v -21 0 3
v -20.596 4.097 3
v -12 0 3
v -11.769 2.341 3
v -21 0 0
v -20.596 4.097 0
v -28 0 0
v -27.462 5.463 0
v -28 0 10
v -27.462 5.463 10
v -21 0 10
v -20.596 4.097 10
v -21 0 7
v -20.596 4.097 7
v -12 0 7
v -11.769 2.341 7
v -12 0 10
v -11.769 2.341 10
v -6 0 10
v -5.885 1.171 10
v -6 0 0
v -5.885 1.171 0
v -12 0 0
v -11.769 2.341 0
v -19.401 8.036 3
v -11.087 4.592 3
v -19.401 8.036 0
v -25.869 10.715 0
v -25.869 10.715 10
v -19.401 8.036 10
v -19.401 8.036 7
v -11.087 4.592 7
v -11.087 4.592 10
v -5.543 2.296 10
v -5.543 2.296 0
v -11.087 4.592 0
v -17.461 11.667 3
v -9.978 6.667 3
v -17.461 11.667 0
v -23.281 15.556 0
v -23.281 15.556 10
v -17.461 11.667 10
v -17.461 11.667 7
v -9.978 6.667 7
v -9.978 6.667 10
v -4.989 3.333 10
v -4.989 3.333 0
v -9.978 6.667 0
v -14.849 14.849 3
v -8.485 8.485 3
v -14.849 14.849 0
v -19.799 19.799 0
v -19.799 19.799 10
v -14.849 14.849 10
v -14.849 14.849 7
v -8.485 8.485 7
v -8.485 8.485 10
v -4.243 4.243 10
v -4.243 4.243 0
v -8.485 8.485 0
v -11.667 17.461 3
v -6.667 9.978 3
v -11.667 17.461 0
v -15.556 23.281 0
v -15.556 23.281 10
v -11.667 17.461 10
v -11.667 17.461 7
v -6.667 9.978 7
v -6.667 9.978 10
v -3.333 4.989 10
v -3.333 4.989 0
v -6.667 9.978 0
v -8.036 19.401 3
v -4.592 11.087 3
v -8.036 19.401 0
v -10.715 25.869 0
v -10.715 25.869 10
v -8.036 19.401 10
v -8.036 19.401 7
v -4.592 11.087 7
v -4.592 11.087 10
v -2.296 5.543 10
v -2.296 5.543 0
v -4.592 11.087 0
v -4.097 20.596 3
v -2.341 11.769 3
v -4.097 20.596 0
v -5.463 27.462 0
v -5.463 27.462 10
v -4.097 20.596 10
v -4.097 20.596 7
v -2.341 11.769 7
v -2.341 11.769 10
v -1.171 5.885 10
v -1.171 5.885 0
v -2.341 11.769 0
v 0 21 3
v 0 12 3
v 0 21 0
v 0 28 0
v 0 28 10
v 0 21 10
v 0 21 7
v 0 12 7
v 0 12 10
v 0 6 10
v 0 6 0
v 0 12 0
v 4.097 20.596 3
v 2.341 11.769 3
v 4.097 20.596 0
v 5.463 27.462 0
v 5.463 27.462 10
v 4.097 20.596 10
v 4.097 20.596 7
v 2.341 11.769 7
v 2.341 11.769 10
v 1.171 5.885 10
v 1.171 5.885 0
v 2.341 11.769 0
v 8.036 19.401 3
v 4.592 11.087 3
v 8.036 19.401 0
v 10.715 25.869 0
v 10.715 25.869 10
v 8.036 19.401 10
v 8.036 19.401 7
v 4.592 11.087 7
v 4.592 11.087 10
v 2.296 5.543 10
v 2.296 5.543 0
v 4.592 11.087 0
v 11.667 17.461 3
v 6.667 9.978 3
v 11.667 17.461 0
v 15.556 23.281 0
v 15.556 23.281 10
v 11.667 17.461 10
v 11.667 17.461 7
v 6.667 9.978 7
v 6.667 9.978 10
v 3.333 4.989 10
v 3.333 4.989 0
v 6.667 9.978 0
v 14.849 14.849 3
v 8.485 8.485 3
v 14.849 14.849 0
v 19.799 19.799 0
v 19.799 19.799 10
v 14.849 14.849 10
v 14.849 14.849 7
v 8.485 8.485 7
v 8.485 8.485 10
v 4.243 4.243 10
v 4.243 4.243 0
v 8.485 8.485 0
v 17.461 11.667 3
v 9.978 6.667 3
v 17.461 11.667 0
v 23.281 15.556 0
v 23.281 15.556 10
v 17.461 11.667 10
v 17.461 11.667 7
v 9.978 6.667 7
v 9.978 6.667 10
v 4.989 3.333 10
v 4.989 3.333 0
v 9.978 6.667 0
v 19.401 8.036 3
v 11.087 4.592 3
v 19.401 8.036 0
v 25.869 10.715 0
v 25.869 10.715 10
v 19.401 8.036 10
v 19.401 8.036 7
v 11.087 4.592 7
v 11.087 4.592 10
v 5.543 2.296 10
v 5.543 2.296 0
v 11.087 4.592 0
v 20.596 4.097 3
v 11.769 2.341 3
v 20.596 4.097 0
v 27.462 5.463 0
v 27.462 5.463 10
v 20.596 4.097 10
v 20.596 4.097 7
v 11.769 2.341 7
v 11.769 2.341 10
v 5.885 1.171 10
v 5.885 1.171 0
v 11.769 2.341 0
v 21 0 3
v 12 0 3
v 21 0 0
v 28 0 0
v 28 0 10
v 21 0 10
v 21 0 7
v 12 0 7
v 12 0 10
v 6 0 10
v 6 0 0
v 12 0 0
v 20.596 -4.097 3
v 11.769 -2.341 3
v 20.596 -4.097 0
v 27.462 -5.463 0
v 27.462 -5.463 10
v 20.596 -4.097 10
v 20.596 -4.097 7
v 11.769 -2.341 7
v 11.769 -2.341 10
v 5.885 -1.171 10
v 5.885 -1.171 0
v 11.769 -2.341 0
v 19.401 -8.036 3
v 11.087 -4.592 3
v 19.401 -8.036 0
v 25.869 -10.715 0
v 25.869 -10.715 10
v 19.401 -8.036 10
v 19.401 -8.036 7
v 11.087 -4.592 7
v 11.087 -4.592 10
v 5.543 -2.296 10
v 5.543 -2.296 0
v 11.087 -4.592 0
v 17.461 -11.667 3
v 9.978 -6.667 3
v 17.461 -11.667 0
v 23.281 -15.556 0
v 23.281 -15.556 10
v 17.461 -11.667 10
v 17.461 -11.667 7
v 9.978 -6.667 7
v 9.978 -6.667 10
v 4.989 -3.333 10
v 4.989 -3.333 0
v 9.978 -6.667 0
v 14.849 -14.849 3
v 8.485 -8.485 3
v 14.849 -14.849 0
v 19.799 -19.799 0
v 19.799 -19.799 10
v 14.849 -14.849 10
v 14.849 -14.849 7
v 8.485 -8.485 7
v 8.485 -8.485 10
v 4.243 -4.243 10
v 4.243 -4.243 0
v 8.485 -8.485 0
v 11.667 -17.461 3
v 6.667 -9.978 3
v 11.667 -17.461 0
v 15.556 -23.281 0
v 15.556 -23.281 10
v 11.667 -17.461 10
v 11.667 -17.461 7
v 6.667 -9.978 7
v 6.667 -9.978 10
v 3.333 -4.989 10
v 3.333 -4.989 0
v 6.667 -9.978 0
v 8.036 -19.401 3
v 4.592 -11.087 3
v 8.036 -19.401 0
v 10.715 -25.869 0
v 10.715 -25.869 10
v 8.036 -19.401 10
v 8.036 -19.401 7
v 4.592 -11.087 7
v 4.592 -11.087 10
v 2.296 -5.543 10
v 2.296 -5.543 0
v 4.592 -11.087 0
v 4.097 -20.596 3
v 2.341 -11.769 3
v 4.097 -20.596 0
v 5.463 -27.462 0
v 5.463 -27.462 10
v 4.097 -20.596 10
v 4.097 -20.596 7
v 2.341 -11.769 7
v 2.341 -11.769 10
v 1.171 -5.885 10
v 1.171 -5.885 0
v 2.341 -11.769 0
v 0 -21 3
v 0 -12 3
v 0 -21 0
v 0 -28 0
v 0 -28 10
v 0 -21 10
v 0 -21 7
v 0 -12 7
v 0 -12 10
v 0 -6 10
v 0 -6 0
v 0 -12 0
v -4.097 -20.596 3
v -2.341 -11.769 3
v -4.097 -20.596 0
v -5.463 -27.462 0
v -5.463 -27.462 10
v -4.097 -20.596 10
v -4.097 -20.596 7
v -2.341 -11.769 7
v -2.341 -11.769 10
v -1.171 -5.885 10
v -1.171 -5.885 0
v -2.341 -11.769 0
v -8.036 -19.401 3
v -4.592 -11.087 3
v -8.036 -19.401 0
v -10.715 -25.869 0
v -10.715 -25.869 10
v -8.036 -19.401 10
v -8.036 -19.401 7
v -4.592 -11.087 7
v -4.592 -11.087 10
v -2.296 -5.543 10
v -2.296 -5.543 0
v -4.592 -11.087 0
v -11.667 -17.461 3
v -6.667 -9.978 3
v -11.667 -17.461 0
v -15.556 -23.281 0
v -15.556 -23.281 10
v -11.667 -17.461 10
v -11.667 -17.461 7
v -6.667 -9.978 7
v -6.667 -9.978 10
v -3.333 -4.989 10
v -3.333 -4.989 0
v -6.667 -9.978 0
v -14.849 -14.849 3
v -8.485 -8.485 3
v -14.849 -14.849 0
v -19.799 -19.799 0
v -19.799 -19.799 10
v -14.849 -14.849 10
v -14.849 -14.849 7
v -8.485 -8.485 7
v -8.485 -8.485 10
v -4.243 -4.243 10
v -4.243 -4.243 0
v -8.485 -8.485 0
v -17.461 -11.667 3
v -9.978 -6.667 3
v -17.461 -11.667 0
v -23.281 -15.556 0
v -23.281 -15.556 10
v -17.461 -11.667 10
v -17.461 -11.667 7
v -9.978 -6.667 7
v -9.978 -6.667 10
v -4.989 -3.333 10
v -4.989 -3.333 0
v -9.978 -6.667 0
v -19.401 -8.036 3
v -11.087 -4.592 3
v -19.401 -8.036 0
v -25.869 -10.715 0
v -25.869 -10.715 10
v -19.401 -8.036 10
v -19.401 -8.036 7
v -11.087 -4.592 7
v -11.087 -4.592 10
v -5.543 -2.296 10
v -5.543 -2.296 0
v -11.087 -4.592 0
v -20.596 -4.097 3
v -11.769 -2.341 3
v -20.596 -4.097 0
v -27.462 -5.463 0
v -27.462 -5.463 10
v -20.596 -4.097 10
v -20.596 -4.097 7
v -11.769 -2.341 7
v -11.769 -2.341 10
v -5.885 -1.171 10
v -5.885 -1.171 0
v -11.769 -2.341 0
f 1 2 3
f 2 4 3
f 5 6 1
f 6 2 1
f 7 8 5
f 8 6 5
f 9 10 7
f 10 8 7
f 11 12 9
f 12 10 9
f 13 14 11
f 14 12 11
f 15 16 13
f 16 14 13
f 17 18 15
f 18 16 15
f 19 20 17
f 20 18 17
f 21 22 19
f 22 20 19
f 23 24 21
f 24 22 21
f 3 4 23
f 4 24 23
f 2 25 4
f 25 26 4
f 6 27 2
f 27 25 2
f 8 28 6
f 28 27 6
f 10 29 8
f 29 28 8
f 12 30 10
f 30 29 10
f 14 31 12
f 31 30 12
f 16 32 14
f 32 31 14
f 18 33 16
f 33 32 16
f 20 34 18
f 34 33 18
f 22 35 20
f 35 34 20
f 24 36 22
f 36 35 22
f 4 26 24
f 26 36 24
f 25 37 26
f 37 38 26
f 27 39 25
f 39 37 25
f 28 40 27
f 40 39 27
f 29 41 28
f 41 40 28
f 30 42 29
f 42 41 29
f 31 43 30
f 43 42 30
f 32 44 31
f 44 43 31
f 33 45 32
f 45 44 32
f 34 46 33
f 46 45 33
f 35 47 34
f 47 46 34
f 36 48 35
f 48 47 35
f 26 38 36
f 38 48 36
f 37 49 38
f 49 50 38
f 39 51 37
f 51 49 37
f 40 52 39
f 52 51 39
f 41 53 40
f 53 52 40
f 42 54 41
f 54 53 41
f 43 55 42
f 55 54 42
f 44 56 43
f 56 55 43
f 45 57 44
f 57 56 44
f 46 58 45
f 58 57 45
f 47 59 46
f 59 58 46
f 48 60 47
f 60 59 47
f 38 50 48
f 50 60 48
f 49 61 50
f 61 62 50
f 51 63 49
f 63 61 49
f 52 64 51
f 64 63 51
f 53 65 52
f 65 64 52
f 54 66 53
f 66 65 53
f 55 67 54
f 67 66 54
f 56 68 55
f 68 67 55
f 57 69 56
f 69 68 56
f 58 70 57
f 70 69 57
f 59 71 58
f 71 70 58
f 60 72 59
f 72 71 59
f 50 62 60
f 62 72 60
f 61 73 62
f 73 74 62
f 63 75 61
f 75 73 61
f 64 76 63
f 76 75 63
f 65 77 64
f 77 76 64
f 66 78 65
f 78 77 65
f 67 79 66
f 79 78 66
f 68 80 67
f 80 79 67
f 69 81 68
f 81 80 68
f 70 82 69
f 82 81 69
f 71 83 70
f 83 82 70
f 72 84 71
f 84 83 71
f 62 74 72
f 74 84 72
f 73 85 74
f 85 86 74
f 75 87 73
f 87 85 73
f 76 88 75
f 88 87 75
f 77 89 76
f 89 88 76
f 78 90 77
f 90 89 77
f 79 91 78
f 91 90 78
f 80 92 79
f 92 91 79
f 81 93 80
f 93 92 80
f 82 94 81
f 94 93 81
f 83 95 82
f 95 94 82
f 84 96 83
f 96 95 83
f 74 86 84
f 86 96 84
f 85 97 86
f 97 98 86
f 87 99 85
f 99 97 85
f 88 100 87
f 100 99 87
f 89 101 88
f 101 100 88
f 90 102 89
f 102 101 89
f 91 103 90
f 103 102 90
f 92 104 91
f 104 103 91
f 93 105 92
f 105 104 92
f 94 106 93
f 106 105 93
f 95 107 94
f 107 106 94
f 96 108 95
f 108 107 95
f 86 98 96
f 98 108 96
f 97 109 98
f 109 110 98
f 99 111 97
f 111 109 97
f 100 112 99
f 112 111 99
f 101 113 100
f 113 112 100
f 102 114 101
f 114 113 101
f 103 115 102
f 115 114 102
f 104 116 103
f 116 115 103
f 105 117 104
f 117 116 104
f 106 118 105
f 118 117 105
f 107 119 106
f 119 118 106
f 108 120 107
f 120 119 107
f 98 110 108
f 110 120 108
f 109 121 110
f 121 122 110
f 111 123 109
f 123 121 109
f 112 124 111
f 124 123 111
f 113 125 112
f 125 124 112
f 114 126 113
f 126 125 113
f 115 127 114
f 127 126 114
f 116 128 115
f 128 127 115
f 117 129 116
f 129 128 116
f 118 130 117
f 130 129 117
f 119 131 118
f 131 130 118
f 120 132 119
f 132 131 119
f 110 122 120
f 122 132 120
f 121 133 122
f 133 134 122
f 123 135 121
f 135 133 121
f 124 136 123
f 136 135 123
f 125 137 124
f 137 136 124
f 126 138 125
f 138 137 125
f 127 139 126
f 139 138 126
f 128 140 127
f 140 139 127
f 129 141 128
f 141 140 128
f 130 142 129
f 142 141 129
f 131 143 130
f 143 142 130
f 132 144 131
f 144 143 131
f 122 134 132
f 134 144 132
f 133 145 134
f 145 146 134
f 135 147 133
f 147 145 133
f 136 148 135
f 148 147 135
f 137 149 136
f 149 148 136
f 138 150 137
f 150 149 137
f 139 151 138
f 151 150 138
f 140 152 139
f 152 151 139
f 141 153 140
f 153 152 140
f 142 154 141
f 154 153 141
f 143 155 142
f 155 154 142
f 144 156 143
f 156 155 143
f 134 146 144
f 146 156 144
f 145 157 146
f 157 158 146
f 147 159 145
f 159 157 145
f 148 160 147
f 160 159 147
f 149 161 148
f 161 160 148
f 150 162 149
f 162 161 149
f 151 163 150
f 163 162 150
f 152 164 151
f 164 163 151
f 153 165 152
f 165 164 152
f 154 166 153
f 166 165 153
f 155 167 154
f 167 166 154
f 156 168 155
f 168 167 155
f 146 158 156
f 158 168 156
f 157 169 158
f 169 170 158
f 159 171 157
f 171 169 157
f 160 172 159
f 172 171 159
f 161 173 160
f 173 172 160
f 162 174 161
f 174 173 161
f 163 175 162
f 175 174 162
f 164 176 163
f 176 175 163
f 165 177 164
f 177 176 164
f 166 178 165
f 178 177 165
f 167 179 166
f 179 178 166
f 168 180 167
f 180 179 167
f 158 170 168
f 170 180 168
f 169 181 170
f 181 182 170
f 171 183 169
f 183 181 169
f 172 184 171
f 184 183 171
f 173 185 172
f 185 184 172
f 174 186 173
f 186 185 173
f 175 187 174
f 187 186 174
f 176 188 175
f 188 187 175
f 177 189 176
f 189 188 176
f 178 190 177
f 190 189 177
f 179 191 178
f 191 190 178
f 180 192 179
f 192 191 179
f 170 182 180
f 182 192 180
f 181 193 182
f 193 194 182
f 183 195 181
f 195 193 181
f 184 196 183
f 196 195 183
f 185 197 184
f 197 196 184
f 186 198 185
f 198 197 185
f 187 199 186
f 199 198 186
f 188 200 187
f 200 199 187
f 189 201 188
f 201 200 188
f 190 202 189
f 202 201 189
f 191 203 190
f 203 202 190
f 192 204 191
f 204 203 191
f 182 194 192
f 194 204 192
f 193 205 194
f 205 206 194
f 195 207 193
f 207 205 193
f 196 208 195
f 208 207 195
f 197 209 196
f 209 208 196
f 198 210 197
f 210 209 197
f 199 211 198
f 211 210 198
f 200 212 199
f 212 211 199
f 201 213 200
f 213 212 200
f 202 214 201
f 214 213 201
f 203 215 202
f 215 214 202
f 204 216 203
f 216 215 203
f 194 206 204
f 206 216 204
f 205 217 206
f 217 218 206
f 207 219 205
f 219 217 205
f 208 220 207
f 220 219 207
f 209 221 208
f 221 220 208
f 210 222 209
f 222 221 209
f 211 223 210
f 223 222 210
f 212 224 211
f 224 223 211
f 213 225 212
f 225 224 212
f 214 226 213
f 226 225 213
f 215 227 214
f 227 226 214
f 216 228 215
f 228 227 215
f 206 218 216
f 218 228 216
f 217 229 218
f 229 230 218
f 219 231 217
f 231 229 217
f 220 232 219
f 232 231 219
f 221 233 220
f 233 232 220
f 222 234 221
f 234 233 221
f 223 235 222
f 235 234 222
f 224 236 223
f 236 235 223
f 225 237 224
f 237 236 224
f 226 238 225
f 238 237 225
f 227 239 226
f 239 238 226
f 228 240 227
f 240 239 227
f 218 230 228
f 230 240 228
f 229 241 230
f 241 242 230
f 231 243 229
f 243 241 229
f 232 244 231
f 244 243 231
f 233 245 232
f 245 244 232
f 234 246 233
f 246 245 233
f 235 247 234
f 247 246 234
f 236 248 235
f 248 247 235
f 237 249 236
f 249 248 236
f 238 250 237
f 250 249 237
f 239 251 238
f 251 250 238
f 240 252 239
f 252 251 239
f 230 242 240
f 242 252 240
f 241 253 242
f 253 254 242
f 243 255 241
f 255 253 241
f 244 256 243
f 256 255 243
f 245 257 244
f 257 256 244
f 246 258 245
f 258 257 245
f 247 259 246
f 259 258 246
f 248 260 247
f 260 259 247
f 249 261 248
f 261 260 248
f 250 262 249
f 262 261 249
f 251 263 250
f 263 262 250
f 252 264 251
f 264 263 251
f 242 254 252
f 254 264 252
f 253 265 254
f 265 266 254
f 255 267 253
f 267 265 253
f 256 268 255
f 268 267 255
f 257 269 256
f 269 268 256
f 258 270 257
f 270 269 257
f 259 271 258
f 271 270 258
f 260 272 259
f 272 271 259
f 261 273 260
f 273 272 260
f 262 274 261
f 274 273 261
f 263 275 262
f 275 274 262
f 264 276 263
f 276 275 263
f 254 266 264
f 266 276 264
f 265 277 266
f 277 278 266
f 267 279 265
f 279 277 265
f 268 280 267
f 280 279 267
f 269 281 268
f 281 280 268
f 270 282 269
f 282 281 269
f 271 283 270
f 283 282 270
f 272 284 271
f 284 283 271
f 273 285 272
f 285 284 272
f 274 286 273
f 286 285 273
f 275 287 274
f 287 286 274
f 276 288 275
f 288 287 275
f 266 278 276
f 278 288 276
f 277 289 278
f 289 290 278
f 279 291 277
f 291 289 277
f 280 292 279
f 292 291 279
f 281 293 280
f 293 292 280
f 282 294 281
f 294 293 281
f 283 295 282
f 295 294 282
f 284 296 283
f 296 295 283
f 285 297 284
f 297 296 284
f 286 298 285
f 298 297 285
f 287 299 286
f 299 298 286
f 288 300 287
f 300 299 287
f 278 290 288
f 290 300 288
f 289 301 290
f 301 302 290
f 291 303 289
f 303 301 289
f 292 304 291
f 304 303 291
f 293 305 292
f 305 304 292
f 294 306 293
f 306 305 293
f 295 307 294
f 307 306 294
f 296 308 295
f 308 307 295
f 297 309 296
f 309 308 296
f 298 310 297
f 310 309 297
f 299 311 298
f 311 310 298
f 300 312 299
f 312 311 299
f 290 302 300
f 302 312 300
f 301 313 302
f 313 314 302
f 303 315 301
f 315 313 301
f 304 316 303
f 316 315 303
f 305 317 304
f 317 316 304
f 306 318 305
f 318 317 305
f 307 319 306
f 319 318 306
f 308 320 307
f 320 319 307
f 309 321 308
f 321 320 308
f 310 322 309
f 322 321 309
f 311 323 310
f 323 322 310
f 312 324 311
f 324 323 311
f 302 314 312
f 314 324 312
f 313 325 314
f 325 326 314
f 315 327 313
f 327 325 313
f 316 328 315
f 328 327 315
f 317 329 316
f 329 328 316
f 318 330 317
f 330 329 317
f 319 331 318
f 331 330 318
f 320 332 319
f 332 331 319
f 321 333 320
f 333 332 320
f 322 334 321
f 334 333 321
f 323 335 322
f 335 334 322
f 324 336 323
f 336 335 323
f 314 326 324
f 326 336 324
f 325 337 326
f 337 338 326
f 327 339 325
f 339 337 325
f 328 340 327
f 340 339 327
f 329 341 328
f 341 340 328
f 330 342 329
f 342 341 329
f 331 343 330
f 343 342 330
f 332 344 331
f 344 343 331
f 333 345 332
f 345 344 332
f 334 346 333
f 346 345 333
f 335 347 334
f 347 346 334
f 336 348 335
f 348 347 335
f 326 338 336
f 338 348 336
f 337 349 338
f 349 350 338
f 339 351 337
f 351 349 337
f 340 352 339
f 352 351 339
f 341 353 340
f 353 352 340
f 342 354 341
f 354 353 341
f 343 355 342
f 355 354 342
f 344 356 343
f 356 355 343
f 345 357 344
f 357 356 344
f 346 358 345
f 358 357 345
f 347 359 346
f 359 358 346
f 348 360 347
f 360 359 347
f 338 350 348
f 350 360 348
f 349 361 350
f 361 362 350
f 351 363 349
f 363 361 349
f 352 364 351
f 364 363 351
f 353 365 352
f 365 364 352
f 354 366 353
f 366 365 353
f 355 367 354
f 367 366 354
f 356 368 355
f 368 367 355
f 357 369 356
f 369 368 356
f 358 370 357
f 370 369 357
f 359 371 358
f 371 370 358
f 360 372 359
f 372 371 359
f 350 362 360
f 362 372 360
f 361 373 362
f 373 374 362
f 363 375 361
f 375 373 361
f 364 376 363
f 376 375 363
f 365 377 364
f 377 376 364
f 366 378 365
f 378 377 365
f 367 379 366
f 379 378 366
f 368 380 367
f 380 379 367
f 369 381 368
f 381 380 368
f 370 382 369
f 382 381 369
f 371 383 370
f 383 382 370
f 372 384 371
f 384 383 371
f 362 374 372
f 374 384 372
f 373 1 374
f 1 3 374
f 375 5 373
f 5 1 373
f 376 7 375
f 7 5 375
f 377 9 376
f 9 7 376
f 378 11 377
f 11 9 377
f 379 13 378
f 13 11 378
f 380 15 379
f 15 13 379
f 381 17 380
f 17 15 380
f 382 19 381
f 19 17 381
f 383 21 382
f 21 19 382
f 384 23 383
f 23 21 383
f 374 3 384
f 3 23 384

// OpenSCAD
$fn = 32;

// ----------------------------------------------------------------------
// Revolved part: handwheel R28
// ----------------------------------------------------------------------

// --- parameters (mm) ---
bore_r = 6;               // bore radius
rim_r = 28;               // rim radius
rim_w = 7;                // rim axial width
rim_t = 10;               // rim diameter height
hub_r = 12;               // hub radius
web_t = 4;                // web thickness
revolve_angle = 360;      // revolve sweep, degrees

bore_d = 2 * bore_r;
rim_d = 2 * rim_r;
hub_d = 2 * hub_r;

profile = [[6, 0], [12, 0], [12, 3], [21, 3], [21, 0], [28, 0], [28, 10], [21, 10], [21, 7], [12, 7], [12, 10], [6, 10]];  // primary outline, 12 points, counter clockwise

// --- the one profile operation ---
rotate_extrude(angle = revolve_angle) polygon(points = profile);
